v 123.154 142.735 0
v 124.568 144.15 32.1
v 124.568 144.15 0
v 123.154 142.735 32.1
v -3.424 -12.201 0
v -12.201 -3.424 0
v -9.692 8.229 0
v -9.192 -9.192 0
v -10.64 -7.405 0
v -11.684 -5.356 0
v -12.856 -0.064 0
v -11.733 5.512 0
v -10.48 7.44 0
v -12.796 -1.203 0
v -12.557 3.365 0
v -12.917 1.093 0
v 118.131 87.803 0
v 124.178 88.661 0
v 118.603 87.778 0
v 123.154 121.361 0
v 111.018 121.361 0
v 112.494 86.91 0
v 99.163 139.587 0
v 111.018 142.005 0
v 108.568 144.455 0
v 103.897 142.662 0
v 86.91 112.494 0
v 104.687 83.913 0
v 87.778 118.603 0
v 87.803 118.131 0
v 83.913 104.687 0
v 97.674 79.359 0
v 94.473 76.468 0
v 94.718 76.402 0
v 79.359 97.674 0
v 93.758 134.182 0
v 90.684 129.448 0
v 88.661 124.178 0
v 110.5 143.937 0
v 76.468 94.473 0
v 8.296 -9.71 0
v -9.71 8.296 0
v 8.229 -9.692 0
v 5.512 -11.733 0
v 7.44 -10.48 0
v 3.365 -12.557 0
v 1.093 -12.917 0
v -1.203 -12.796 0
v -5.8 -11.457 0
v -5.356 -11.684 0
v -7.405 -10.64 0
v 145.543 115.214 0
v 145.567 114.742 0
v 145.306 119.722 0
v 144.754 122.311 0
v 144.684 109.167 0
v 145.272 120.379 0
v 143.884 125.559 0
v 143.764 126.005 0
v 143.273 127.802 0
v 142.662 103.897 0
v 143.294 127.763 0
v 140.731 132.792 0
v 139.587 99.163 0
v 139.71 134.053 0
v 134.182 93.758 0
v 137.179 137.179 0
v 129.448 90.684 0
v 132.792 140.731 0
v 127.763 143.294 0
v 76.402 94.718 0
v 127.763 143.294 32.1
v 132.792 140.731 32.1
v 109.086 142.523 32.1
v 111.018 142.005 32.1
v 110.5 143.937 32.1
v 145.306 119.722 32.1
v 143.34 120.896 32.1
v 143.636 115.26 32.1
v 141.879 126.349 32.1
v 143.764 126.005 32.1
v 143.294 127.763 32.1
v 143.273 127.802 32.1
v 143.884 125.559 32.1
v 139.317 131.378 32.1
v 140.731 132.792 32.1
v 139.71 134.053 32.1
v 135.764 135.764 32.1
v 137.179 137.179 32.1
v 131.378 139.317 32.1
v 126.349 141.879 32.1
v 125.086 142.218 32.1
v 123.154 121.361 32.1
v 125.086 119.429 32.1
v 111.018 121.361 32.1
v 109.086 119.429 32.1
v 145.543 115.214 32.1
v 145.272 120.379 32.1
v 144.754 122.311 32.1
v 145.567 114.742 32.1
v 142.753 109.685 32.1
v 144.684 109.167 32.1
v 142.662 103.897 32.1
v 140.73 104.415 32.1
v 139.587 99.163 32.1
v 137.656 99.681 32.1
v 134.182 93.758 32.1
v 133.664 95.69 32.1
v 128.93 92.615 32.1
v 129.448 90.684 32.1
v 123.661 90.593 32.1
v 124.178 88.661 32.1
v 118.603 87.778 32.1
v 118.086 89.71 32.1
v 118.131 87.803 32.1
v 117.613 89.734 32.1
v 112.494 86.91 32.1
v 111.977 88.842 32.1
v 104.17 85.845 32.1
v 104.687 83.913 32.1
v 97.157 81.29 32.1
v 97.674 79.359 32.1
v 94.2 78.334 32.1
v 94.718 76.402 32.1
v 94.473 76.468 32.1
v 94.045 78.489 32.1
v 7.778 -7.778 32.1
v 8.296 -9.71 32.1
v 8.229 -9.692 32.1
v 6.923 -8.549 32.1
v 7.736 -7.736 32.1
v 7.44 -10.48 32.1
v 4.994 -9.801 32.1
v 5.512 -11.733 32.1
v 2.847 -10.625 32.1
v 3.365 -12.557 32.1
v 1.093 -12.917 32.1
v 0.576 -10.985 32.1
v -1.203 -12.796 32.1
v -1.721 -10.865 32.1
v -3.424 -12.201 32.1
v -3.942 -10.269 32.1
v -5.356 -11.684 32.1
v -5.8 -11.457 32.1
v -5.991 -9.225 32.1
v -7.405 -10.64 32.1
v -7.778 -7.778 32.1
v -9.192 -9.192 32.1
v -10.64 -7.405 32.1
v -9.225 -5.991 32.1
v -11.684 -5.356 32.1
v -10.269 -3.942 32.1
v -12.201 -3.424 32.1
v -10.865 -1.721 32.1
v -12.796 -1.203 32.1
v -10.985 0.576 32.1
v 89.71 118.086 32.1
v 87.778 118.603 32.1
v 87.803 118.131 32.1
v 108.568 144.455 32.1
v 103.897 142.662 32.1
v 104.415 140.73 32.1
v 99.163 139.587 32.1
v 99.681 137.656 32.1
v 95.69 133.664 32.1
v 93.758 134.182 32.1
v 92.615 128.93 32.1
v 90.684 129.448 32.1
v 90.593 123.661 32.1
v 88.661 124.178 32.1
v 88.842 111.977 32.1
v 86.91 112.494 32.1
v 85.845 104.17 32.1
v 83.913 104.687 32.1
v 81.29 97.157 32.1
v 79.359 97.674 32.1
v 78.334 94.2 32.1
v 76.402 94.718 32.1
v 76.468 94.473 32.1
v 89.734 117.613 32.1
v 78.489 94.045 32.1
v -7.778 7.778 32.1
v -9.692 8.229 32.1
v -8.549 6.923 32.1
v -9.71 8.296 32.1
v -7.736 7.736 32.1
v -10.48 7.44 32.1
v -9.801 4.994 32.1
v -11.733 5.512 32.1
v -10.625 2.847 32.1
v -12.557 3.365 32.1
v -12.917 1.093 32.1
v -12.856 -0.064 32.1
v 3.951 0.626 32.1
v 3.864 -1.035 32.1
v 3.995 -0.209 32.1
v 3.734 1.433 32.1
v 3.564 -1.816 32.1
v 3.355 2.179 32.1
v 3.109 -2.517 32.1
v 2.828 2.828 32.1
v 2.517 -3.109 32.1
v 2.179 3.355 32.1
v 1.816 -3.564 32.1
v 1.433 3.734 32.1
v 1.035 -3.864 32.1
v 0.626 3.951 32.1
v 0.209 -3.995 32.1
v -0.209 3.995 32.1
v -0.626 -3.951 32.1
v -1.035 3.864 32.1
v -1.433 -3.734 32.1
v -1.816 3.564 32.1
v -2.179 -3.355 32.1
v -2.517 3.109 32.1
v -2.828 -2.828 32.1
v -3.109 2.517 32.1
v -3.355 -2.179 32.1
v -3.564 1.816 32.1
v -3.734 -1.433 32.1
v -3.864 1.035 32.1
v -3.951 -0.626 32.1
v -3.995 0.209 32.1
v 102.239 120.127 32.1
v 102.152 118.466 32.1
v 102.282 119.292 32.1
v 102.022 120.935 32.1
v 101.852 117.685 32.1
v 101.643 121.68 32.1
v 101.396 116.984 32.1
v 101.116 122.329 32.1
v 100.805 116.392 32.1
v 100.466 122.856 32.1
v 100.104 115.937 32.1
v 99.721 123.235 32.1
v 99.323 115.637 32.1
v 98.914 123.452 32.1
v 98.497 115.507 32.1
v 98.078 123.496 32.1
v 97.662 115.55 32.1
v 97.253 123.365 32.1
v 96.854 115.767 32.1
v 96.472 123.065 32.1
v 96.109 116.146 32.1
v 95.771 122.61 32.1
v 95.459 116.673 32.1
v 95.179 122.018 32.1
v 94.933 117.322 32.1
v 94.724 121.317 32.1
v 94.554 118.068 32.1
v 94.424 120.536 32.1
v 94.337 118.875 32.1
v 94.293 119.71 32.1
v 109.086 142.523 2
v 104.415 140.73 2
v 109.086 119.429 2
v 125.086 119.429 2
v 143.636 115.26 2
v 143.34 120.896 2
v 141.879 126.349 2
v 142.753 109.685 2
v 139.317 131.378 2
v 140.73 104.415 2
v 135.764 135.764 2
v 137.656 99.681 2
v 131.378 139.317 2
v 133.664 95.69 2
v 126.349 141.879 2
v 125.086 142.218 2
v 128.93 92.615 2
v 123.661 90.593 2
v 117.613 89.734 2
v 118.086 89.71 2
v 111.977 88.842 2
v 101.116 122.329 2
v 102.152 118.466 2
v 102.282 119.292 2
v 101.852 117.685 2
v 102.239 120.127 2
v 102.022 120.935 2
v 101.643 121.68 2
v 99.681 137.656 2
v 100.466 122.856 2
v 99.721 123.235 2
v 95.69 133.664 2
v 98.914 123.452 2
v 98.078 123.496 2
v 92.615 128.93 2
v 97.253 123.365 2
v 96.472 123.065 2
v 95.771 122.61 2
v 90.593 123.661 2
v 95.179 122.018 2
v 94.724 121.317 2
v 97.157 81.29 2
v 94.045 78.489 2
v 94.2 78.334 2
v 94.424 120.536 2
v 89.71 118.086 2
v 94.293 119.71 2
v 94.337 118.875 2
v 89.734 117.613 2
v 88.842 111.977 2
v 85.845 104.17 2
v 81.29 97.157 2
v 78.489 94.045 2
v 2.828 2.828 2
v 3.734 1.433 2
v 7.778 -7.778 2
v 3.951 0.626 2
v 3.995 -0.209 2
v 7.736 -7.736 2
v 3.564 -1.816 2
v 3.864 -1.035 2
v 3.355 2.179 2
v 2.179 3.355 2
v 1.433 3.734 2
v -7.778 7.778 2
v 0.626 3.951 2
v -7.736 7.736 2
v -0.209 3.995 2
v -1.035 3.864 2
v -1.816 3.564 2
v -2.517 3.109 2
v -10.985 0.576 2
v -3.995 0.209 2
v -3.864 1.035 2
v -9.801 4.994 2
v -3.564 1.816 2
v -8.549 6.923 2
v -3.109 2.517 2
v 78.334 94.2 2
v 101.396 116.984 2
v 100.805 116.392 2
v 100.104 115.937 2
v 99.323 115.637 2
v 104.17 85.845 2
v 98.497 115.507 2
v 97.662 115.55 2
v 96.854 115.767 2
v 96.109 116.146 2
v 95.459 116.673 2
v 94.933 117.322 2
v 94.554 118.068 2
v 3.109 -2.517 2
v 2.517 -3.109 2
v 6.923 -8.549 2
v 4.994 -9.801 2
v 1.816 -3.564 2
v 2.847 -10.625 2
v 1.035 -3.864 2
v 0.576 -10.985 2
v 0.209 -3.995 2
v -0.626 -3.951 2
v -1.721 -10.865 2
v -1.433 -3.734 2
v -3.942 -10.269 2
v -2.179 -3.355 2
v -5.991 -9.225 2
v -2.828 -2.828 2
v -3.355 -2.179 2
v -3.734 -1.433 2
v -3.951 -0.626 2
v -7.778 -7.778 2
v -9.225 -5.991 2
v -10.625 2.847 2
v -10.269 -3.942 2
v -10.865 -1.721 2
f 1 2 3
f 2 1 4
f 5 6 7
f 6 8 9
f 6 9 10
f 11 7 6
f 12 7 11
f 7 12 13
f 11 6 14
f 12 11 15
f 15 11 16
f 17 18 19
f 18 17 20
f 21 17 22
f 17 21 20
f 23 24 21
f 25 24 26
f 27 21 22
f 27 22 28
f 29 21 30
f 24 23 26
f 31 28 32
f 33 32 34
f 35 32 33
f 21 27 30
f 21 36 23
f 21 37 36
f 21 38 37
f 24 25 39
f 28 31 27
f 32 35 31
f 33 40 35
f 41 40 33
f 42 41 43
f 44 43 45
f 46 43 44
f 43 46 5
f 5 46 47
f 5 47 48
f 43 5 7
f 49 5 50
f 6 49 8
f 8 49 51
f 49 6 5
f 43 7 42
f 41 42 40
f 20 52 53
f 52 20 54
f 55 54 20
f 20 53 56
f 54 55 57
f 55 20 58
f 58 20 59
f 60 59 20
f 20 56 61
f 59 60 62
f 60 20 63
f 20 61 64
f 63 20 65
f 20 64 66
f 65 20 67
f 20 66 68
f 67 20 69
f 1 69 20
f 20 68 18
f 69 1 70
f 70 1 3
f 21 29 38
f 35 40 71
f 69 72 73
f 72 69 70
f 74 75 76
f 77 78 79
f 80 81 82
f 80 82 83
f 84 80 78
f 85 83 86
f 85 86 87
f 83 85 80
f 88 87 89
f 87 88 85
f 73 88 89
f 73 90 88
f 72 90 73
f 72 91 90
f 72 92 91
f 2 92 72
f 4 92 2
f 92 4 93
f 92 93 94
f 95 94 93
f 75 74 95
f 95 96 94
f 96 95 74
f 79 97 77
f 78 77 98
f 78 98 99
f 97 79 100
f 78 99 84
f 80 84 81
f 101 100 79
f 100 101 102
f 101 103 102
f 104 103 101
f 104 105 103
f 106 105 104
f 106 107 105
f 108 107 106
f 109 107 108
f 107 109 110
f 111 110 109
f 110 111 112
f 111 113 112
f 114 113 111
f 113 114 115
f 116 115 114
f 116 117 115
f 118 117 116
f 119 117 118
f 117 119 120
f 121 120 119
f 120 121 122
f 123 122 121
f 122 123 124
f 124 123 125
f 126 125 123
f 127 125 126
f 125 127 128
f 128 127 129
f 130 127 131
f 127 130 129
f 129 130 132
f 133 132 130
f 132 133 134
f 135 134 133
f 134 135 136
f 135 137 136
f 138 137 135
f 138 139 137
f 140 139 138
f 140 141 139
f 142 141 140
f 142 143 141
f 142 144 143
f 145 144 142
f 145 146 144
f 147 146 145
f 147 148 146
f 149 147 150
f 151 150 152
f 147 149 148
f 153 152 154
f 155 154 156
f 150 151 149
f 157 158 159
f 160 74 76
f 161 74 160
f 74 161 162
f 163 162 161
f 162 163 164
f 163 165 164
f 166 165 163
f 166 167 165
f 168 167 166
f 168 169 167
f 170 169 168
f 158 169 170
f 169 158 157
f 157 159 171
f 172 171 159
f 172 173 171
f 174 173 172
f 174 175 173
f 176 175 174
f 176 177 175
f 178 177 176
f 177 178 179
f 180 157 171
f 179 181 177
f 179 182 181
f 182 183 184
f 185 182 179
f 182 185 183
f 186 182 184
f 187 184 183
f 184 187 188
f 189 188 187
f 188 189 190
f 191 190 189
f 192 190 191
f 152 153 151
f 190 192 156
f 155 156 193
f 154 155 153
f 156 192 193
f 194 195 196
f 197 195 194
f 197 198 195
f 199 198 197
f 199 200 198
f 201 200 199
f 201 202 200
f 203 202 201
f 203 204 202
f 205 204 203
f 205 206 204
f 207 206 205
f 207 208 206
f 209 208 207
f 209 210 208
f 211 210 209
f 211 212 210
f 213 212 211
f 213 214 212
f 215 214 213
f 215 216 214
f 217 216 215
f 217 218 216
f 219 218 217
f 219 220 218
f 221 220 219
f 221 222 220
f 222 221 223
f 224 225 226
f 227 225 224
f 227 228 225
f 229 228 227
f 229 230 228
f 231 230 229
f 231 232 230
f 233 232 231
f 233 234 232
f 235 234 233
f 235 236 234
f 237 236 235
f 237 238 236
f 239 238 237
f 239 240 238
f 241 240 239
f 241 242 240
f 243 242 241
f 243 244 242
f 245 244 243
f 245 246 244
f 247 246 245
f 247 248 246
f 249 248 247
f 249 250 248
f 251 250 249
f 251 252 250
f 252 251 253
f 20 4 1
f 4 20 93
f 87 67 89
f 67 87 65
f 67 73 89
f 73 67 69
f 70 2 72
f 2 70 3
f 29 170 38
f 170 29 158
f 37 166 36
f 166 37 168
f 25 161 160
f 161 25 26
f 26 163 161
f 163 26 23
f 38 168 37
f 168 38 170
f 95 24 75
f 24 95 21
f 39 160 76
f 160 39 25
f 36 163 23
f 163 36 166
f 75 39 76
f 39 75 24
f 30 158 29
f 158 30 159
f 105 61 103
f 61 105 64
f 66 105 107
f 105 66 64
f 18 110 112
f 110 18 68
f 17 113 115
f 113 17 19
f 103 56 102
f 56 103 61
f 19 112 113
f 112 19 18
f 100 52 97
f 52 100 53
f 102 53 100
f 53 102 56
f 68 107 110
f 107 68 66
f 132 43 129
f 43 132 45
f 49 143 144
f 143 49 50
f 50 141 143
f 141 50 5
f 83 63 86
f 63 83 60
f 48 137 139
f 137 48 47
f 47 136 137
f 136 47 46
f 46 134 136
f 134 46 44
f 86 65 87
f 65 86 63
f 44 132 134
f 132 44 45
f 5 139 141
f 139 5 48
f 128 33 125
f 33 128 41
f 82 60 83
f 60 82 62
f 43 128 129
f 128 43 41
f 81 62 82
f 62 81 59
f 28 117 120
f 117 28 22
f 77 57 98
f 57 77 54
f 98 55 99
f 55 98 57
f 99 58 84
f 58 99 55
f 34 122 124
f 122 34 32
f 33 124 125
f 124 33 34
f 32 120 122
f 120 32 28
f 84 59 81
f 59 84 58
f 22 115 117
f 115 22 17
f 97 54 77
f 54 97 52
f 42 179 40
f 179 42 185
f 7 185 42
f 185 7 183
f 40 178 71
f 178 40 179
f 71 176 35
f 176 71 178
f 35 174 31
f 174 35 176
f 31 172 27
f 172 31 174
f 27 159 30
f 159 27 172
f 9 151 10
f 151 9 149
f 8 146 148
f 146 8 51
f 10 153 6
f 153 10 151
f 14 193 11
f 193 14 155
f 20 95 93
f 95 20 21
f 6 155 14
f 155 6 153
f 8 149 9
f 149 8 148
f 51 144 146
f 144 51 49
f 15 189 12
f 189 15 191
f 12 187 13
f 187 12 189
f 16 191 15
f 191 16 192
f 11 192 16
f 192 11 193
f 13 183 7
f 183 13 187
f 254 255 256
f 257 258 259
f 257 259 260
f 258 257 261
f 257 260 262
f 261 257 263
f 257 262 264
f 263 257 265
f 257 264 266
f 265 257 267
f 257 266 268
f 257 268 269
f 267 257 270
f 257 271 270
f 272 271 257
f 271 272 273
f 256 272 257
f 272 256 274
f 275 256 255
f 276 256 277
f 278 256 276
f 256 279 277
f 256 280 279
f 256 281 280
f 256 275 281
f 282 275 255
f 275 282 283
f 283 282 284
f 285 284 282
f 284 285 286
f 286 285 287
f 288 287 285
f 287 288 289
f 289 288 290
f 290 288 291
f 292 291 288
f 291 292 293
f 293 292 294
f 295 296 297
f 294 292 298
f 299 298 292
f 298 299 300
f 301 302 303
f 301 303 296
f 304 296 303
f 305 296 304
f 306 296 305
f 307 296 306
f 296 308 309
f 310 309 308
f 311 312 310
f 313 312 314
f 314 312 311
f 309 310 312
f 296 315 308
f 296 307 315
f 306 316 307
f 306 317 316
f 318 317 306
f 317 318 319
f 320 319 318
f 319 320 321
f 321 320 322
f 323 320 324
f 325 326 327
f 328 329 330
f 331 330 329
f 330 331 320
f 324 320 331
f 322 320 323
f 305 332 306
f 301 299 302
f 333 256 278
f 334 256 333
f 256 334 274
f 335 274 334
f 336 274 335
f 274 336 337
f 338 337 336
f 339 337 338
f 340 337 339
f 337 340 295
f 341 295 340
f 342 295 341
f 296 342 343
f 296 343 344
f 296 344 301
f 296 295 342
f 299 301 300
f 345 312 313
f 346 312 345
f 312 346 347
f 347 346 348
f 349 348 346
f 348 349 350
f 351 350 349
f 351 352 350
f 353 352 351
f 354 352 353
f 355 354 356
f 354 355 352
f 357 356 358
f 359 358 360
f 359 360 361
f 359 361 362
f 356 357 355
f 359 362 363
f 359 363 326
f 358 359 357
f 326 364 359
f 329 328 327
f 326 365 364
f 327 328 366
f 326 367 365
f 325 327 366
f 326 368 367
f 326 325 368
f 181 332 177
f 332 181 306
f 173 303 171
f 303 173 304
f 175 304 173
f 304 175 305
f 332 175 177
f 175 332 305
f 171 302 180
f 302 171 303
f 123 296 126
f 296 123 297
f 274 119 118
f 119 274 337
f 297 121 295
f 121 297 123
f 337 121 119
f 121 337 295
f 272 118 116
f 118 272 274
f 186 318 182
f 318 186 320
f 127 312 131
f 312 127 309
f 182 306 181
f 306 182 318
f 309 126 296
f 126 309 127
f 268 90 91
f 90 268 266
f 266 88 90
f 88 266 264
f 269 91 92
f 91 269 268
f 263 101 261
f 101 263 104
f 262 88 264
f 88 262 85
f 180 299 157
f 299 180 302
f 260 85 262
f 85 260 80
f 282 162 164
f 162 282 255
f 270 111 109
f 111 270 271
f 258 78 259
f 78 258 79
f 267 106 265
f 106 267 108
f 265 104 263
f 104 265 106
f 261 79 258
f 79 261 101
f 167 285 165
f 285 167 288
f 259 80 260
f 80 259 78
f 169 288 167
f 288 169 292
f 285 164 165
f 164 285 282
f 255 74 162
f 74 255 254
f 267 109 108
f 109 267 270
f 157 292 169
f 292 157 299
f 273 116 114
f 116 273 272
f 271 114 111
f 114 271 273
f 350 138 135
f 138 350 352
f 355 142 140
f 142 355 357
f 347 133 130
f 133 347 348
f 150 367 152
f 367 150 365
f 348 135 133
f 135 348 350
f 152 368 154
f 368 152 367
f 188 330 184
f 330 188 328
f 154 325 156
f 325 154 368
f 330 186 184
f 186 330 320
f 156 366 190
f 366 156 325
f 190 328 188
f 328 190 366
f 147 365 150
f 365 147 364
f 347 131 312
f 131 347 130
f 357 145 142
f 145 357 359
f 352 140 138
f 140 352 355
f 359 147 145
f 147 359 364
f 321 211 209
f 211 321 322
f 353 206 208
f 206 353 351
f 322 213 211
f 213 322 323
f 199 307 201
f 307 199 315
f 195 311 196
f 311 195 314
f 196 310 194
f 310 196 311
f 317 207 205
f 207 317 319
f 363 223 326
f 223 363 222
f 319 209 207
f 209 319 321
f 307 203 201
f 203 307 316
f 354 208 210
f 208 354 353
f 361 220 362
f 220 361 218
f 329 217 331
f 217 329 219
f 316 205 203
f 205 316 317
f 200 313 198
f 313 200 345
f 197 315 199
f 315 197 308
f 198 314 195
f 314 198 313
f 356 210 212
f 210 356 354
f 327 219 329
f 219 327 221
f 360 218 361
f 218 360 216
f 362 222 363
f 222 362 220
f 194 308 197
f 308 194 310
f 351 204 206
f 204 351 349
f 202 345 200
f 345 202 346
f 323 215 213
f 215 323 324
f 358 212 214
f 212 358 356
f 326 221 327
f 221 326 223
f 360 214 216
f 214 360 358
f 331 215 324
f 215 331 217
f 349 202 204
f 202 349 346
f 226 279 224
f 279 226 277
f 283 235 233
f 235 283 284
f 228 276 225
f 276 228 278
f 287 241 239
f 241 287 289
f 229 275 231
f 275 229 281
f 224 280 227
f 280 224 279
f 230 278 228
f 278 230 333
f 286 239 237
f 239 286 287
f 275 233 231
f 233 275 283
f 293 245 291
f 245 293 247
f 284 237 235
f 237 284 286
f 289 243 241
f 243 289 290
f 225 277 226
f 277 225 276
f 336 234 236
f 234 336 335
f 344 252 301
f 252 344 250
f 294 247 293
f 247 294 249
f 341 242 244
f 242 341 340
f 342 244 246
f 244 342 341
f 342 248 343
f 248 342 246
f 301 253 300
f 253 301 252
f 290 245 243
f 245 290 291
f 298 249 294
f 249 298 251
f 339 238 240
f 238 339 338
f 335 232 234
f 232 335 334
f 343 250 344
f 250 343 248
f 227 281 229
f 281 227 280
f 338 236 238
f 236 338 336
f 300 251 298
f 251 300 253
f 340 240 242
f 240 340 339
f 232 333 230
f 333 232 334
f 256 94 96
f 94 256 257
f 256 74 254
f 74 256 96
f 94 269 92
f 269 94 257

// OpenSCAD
$fn=30;
//thickness
th = 30+2;




module skylt(holes=true)
{
difference()
{
union()
{
translate([0,-11,0])
cube([165,22,th]);

translate([165,0,0])
cylinder(r=54/2, h=th);


translate([0,0,0])
cylinder(r=11, h=th);




difference()
{
translate([165-43,0,0])
cube([30,20,th]);

translate([165-43,40+11,-1])
cylinder(r=40,h=th+2);
}

mirror([0,1,0])
difference()
{
translate([165-43,0,0])
cube([30,20,th]);


translate([165-43,40+11,-1])
cylinder(r=40,h=th+2);
}

}

translate([165+14*.707-2,-6+2,0])
rotate([0,0,45])
cube([25,16,th+2]);

if(holes)
{
cylinder(r=4, h=th+2);

translate([165-11,15,0])
cylinder(r=4, h=th+2);
}

}
}

rotate([0,0,45])
difference()
{
minkowski()
{
skylt(holes=false);
cylinder(r=2,h=.1,$fn=6);
}

translate([0,0,2])
skylt();
}
